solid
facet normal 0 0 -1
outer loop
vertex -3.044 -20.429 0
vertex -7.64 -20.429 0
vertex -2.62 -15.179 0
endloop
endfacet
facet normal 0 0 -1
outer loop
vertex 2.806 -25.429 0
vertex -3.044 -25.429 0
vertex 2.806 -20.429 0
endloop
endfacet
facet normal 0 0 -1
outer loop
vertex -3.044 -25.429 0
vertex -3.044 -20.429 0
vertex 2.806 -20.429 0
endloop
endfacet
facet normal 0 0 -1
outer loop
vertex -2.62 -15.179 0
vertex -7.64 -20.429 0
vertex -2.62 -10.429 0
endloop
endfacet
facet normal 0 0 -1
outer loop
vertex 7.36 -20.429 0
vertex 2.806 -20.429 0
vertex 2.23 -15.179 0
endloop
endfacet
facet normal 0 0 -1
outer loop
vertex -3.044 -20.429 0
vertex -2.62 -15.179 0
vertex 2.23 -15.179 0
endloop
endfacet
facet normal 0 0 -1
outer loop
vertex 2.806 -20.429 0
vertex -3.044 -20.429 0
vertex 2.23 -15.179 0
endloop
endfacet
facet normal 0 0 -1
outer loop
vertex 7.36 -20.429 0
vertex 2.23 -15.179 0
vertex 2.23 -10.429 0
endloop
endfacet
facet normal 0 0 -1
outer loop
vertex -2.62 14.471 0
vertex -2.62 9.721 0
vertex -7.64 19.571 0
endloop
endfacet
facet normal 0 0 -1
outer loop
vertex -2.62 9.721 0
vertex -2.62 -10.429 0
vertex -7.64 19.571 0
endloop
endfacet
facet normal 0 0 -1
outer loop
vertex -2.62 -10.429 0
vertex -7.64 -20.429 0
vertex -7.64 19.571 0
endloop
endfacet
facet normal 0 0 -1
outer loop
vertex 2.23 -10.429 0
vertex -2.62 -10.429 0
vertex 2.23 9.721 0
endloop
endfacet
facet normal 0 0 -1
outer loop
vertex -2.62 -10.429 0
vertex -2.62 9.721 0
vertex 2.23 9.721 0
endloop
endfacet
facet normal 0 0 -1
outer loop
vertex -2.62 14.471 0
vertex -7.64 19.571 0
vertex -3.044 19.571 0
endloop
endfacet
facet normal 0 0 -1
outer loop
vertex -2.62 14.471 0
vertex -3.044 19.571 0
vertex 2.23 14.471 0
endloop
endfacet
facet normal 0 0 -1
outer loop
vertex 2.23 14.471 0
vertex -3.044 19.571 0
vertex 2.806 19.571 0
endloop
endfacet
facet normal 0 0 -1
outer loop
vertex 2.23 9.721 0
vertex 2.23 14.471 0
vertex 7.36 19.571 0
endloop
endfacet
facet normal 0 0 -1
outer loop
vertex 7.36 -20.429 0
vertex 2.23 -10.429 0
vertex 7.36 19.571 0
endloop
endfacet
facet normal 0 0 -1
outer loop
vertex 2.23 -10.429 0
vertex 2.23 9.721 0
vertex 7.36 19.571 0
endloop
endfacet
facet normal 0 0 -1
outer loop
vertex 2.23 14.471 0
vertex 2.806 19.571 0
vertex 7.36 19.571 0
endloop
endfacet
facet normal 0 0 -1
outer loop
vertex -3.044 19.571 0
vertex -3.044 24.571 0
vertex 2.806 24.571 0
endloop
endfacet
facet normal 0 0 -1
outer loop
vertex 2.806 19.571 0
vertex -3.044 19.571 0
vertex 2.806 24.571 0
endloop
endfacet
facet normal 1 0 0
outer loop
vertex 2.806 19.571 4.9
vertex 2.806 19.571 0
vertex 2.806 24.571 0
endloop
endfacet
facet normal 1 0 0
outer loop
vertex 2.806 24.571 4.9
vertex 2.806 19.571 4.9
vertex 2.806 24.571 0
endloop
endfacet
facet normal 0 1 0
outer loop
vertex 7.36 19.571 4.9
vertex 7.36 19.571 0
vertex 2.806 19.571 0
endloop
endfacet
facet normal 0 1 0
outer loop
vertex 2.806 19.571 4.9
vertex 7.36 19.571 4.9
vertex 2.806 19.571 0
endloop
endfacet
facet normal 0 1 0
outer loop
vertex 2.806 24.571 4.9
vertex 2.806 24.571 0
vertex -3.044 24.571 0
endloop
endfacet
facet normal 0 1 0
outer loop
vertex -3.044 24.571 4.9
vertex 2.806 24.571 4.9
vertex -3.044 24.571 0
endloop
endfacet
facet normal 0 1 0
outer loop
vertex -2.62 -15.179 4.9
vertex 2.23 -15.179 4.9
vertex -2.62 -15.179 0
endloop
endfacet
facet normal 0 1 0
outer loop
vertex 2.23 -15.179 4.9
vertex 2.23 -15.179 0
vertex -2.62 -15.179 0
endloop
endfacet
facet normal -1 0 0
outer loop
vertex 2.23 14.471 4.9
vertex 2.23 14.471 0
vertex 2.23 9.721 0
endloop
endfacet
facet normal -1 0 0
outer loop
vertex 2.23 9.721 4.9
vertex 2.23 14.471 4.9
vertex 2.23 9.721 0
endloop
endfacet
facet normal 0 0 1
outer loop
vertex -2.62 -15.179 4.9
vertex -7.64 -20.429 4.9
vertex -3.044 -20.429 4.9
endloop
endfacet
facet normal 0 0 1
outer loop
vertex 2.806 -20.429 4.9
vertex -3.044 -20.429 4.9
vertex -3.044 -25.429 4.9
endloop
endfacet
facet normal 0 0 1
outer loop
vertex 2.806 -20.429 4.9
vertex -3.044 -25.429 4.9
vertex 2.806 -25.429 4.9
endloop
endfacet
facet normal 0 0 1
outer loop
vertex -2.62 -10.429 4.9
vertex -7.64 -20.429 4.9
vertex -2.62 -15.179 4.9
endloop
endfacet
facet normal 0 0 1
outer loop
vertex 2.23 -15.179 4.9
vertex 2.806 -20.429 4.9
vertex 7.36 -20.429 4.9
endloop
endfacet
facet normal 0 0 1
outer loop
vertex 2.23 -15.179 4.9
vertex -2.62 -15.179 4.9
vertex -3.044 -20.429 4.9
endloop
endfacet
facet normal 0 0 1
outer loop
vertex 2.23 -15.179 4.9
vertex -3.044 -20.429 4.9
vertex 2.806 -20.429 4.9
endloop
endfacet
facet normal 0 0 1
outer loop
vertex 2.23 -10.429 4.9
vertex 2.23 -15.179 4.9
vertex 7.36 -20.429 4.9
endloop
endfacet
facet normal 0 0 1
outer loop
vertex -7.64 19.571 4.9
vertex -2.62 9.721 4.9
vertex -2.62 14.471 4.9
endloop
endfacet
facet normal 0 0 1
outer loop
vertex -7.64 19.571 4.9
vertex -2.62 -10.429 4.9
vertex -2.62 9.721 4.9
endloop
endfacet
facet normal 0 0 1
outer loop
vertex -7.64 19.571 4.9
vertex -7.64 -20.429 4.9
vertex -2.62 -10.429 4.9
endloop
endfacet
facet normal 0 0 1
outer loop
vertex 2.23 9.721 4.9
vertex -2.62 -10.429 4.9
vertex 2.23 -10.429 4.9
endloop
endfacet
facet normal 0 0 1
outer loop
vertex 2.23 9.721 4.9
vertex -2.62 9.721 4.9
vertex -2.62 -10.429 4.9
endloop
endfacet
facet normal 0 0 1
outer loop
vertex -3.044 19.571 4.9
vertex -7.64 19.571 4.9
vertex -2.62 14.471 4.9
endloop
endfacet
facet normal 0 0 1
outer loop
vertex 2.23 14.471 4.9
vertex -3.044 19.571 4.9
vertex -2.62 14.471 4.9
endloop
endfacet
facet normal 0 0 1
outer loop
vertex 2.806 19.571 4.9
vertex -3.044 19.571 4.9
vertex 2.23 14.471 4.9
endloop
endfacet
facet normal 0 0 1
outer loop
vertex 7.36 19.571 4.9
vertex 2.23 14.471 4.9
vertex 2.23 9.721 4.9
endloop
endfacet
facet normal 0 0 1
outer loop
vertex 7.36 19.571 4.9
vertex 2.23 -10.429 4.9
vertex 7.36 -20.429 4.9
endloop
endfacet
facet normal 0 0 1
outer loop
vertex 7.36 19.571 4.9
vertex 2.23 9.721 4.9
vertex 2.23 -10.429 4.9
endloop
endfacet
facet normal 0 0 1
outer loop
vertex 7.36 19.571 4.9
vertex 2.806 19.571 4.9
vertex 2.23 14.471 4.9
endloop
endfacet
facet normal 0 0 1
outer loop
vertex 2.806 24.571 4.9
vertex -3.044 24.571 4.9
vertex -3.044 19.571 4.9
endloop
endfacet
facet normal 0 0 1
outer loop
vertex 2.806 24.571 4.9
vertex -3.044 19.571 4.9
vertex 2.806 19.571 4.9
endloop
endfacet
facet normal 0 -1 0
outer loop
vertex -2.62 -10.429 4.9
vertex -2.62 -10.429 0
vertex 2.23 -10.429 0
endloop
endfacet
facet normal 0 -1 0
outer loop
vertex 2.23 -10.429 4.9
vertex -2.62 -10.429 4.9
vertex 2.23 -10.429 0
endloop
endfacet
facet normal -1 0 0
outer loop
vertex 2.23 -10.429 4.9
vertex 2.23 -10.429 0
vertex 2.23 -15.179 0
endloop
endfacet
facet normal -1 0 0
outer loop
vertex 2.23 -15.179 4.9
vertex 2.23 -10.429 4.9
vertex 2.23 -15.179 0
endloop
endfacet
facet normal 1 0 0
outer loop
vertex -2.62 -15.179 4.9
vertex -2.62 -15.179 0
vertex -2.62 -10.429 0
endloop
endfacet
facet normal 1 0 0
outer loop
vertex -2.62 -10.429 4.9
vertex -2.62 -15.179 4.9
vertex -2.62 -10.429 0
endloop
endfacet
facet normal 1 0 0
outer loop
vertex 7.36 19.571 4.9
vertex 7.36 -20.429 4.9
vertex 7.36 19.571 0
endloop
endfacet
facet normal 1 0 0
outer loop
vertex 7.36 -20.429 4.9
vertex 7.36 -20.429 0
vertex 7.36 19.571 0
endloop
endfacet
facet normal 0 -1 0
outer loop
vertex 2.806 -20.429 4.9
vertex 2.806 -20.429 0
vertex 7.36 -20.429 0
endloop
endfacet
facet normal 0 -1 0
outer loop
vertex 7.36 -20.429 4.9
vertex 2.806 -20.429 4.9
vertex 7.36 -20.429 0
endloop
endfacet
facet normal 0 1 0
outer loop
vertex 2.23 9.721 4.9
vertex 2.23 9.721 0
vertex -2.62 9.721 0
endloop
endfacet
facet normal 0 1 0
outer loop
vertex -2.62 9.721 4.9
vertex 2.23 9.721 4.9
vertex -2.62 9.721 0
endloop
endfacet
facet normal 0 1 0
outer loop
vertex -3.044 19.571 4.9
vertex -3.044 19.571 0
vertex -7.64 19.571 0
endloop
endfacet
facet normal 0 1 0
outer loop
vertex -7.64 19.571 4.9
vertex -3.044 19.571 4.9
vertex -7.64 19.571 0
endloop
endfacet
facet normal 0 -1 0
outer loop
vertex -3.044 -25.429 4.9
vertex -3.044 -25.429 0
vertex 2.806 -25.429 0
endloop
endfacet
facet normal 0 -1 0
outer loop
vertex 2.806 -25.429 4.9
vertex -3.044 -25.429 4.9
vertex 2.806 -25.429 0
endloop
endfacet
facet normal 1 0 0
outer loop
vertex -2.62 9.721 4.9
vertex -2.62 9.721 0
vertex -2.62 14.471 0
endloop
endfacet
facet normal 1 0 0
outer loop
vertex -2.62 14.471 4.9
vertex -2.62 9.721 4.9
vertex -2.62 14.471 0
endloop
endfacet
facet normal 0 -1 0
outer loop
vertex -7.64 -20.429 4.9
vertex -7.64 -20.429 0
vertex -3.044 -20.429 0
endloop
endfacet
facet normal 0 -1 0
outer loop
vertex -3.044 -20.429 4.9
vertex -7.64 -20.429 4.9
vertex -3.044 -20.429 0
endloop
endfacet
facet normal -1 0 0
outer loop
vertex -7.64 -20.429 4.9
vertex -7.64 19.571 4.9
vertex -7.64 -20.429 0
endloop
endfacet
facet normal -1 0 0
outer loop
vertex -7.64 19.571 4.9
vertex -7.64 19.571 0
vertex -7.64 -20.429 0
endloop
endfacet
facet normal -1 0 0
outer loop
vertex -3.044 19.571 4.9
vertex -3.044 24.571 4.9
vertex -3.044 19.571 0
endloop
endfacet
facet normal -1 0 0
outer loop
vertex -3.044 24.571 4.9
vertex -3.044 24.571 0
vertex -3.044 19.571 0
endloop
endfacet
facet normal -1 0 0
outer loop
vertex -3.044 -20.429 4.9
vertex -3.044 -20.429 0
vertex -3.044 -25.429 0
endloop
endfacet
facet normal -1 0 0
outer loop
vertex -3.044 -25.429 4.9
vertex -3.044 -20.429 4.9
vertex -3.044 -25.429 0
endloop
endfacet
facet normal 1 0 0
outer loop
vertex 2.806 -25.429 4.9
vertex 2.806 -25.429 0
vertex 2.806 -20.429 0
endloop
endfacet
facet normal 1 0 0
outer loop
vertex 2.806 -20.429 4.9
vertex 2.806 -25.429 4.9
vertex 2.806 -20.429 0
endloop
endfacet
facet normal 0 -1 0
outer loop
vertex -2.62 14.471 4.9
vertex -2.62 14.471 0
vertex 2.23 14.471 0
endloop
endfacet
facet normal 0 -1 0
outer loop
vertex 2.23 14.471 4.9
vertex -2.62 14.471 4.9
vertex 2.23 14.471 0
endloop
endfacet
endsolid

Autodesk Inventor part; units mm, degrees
ref_plane "YZ Plane" through (0, 0, 0) normal (1, 0, 0) x (0, 1, 0)
ref_plane "XZ Plane" through (0, 0, 0) normal (0, 1, 0) x (-1, 0, 0)
ref_plane "XY Plane" through (0, 0, 0) normal (0, 0, 1) x (1, 0, 0)
sketch "Эскиз1" plane through (0, 0, 0) normal (0, 0, 1) x (1, 0, 0)
  line L0 (2.2305, 14.4712) -> (2.2305, 9.7212)
  line L1 (2.2305, 9.7212) -> (-2.6195, 9.7212)
  line L2 (-2.6195, 9.7212) -> (-2.6195, 14.4712)
  line L3 (-2.6195, 14.4712) -> (2.2305, 14.4712)
  line L4 (7.3598, -20.4288) -> (7.3598, 19.5712)
  line L5 (7.3598, 19.5712) -> (2.8055, 19.5712)
  line L6 (2.8055, 19.5712) -> (2.8055, 24.5712)
  line L7 (2.8055, 24.5712) -> (-3.0445, 24.5712)
  line L8 (-3.0445, 24.5712) -> (-3.0445, 19.5712)
  line L9 (-3.0445, 19.5712) -> (-7.6402, 19.5712)
  line L10 (-7.6402, 19.5712) -> (-7.6402, -20.4288)
  line L11 (-7.6402, -20.4288) -> (-3.0445, -20.4288)
  line L12 (-3.0445, -20.4288) -> (-3.0445, -25.4288)
  line L13 (-3.0445, -25.4288) -> (2.8055, -25.4288)
  line L14 (2.8055, -25.4288) -> (2.8055, -20.4288)
  line L15 (2.8055, -20.4288) -> (7.3598, -20.4288)
  line L16 (2.2305, -10.4288) -> (2.2305, -15.1788)
  line L17 (2.2305, -15.1788) -> (-2.6195, -15.1788)
  line L18 (-2.6195, -15.1788) -> (-2.6195, -10.4288)
  line L19 (-2.6195, -10.4288) -> (2.2305, -10.4288)
extrude "Выдавливание1" add sketch "Эскиз1" along normal blind 4.9
properties part number "В. шарн. - соединитель"
